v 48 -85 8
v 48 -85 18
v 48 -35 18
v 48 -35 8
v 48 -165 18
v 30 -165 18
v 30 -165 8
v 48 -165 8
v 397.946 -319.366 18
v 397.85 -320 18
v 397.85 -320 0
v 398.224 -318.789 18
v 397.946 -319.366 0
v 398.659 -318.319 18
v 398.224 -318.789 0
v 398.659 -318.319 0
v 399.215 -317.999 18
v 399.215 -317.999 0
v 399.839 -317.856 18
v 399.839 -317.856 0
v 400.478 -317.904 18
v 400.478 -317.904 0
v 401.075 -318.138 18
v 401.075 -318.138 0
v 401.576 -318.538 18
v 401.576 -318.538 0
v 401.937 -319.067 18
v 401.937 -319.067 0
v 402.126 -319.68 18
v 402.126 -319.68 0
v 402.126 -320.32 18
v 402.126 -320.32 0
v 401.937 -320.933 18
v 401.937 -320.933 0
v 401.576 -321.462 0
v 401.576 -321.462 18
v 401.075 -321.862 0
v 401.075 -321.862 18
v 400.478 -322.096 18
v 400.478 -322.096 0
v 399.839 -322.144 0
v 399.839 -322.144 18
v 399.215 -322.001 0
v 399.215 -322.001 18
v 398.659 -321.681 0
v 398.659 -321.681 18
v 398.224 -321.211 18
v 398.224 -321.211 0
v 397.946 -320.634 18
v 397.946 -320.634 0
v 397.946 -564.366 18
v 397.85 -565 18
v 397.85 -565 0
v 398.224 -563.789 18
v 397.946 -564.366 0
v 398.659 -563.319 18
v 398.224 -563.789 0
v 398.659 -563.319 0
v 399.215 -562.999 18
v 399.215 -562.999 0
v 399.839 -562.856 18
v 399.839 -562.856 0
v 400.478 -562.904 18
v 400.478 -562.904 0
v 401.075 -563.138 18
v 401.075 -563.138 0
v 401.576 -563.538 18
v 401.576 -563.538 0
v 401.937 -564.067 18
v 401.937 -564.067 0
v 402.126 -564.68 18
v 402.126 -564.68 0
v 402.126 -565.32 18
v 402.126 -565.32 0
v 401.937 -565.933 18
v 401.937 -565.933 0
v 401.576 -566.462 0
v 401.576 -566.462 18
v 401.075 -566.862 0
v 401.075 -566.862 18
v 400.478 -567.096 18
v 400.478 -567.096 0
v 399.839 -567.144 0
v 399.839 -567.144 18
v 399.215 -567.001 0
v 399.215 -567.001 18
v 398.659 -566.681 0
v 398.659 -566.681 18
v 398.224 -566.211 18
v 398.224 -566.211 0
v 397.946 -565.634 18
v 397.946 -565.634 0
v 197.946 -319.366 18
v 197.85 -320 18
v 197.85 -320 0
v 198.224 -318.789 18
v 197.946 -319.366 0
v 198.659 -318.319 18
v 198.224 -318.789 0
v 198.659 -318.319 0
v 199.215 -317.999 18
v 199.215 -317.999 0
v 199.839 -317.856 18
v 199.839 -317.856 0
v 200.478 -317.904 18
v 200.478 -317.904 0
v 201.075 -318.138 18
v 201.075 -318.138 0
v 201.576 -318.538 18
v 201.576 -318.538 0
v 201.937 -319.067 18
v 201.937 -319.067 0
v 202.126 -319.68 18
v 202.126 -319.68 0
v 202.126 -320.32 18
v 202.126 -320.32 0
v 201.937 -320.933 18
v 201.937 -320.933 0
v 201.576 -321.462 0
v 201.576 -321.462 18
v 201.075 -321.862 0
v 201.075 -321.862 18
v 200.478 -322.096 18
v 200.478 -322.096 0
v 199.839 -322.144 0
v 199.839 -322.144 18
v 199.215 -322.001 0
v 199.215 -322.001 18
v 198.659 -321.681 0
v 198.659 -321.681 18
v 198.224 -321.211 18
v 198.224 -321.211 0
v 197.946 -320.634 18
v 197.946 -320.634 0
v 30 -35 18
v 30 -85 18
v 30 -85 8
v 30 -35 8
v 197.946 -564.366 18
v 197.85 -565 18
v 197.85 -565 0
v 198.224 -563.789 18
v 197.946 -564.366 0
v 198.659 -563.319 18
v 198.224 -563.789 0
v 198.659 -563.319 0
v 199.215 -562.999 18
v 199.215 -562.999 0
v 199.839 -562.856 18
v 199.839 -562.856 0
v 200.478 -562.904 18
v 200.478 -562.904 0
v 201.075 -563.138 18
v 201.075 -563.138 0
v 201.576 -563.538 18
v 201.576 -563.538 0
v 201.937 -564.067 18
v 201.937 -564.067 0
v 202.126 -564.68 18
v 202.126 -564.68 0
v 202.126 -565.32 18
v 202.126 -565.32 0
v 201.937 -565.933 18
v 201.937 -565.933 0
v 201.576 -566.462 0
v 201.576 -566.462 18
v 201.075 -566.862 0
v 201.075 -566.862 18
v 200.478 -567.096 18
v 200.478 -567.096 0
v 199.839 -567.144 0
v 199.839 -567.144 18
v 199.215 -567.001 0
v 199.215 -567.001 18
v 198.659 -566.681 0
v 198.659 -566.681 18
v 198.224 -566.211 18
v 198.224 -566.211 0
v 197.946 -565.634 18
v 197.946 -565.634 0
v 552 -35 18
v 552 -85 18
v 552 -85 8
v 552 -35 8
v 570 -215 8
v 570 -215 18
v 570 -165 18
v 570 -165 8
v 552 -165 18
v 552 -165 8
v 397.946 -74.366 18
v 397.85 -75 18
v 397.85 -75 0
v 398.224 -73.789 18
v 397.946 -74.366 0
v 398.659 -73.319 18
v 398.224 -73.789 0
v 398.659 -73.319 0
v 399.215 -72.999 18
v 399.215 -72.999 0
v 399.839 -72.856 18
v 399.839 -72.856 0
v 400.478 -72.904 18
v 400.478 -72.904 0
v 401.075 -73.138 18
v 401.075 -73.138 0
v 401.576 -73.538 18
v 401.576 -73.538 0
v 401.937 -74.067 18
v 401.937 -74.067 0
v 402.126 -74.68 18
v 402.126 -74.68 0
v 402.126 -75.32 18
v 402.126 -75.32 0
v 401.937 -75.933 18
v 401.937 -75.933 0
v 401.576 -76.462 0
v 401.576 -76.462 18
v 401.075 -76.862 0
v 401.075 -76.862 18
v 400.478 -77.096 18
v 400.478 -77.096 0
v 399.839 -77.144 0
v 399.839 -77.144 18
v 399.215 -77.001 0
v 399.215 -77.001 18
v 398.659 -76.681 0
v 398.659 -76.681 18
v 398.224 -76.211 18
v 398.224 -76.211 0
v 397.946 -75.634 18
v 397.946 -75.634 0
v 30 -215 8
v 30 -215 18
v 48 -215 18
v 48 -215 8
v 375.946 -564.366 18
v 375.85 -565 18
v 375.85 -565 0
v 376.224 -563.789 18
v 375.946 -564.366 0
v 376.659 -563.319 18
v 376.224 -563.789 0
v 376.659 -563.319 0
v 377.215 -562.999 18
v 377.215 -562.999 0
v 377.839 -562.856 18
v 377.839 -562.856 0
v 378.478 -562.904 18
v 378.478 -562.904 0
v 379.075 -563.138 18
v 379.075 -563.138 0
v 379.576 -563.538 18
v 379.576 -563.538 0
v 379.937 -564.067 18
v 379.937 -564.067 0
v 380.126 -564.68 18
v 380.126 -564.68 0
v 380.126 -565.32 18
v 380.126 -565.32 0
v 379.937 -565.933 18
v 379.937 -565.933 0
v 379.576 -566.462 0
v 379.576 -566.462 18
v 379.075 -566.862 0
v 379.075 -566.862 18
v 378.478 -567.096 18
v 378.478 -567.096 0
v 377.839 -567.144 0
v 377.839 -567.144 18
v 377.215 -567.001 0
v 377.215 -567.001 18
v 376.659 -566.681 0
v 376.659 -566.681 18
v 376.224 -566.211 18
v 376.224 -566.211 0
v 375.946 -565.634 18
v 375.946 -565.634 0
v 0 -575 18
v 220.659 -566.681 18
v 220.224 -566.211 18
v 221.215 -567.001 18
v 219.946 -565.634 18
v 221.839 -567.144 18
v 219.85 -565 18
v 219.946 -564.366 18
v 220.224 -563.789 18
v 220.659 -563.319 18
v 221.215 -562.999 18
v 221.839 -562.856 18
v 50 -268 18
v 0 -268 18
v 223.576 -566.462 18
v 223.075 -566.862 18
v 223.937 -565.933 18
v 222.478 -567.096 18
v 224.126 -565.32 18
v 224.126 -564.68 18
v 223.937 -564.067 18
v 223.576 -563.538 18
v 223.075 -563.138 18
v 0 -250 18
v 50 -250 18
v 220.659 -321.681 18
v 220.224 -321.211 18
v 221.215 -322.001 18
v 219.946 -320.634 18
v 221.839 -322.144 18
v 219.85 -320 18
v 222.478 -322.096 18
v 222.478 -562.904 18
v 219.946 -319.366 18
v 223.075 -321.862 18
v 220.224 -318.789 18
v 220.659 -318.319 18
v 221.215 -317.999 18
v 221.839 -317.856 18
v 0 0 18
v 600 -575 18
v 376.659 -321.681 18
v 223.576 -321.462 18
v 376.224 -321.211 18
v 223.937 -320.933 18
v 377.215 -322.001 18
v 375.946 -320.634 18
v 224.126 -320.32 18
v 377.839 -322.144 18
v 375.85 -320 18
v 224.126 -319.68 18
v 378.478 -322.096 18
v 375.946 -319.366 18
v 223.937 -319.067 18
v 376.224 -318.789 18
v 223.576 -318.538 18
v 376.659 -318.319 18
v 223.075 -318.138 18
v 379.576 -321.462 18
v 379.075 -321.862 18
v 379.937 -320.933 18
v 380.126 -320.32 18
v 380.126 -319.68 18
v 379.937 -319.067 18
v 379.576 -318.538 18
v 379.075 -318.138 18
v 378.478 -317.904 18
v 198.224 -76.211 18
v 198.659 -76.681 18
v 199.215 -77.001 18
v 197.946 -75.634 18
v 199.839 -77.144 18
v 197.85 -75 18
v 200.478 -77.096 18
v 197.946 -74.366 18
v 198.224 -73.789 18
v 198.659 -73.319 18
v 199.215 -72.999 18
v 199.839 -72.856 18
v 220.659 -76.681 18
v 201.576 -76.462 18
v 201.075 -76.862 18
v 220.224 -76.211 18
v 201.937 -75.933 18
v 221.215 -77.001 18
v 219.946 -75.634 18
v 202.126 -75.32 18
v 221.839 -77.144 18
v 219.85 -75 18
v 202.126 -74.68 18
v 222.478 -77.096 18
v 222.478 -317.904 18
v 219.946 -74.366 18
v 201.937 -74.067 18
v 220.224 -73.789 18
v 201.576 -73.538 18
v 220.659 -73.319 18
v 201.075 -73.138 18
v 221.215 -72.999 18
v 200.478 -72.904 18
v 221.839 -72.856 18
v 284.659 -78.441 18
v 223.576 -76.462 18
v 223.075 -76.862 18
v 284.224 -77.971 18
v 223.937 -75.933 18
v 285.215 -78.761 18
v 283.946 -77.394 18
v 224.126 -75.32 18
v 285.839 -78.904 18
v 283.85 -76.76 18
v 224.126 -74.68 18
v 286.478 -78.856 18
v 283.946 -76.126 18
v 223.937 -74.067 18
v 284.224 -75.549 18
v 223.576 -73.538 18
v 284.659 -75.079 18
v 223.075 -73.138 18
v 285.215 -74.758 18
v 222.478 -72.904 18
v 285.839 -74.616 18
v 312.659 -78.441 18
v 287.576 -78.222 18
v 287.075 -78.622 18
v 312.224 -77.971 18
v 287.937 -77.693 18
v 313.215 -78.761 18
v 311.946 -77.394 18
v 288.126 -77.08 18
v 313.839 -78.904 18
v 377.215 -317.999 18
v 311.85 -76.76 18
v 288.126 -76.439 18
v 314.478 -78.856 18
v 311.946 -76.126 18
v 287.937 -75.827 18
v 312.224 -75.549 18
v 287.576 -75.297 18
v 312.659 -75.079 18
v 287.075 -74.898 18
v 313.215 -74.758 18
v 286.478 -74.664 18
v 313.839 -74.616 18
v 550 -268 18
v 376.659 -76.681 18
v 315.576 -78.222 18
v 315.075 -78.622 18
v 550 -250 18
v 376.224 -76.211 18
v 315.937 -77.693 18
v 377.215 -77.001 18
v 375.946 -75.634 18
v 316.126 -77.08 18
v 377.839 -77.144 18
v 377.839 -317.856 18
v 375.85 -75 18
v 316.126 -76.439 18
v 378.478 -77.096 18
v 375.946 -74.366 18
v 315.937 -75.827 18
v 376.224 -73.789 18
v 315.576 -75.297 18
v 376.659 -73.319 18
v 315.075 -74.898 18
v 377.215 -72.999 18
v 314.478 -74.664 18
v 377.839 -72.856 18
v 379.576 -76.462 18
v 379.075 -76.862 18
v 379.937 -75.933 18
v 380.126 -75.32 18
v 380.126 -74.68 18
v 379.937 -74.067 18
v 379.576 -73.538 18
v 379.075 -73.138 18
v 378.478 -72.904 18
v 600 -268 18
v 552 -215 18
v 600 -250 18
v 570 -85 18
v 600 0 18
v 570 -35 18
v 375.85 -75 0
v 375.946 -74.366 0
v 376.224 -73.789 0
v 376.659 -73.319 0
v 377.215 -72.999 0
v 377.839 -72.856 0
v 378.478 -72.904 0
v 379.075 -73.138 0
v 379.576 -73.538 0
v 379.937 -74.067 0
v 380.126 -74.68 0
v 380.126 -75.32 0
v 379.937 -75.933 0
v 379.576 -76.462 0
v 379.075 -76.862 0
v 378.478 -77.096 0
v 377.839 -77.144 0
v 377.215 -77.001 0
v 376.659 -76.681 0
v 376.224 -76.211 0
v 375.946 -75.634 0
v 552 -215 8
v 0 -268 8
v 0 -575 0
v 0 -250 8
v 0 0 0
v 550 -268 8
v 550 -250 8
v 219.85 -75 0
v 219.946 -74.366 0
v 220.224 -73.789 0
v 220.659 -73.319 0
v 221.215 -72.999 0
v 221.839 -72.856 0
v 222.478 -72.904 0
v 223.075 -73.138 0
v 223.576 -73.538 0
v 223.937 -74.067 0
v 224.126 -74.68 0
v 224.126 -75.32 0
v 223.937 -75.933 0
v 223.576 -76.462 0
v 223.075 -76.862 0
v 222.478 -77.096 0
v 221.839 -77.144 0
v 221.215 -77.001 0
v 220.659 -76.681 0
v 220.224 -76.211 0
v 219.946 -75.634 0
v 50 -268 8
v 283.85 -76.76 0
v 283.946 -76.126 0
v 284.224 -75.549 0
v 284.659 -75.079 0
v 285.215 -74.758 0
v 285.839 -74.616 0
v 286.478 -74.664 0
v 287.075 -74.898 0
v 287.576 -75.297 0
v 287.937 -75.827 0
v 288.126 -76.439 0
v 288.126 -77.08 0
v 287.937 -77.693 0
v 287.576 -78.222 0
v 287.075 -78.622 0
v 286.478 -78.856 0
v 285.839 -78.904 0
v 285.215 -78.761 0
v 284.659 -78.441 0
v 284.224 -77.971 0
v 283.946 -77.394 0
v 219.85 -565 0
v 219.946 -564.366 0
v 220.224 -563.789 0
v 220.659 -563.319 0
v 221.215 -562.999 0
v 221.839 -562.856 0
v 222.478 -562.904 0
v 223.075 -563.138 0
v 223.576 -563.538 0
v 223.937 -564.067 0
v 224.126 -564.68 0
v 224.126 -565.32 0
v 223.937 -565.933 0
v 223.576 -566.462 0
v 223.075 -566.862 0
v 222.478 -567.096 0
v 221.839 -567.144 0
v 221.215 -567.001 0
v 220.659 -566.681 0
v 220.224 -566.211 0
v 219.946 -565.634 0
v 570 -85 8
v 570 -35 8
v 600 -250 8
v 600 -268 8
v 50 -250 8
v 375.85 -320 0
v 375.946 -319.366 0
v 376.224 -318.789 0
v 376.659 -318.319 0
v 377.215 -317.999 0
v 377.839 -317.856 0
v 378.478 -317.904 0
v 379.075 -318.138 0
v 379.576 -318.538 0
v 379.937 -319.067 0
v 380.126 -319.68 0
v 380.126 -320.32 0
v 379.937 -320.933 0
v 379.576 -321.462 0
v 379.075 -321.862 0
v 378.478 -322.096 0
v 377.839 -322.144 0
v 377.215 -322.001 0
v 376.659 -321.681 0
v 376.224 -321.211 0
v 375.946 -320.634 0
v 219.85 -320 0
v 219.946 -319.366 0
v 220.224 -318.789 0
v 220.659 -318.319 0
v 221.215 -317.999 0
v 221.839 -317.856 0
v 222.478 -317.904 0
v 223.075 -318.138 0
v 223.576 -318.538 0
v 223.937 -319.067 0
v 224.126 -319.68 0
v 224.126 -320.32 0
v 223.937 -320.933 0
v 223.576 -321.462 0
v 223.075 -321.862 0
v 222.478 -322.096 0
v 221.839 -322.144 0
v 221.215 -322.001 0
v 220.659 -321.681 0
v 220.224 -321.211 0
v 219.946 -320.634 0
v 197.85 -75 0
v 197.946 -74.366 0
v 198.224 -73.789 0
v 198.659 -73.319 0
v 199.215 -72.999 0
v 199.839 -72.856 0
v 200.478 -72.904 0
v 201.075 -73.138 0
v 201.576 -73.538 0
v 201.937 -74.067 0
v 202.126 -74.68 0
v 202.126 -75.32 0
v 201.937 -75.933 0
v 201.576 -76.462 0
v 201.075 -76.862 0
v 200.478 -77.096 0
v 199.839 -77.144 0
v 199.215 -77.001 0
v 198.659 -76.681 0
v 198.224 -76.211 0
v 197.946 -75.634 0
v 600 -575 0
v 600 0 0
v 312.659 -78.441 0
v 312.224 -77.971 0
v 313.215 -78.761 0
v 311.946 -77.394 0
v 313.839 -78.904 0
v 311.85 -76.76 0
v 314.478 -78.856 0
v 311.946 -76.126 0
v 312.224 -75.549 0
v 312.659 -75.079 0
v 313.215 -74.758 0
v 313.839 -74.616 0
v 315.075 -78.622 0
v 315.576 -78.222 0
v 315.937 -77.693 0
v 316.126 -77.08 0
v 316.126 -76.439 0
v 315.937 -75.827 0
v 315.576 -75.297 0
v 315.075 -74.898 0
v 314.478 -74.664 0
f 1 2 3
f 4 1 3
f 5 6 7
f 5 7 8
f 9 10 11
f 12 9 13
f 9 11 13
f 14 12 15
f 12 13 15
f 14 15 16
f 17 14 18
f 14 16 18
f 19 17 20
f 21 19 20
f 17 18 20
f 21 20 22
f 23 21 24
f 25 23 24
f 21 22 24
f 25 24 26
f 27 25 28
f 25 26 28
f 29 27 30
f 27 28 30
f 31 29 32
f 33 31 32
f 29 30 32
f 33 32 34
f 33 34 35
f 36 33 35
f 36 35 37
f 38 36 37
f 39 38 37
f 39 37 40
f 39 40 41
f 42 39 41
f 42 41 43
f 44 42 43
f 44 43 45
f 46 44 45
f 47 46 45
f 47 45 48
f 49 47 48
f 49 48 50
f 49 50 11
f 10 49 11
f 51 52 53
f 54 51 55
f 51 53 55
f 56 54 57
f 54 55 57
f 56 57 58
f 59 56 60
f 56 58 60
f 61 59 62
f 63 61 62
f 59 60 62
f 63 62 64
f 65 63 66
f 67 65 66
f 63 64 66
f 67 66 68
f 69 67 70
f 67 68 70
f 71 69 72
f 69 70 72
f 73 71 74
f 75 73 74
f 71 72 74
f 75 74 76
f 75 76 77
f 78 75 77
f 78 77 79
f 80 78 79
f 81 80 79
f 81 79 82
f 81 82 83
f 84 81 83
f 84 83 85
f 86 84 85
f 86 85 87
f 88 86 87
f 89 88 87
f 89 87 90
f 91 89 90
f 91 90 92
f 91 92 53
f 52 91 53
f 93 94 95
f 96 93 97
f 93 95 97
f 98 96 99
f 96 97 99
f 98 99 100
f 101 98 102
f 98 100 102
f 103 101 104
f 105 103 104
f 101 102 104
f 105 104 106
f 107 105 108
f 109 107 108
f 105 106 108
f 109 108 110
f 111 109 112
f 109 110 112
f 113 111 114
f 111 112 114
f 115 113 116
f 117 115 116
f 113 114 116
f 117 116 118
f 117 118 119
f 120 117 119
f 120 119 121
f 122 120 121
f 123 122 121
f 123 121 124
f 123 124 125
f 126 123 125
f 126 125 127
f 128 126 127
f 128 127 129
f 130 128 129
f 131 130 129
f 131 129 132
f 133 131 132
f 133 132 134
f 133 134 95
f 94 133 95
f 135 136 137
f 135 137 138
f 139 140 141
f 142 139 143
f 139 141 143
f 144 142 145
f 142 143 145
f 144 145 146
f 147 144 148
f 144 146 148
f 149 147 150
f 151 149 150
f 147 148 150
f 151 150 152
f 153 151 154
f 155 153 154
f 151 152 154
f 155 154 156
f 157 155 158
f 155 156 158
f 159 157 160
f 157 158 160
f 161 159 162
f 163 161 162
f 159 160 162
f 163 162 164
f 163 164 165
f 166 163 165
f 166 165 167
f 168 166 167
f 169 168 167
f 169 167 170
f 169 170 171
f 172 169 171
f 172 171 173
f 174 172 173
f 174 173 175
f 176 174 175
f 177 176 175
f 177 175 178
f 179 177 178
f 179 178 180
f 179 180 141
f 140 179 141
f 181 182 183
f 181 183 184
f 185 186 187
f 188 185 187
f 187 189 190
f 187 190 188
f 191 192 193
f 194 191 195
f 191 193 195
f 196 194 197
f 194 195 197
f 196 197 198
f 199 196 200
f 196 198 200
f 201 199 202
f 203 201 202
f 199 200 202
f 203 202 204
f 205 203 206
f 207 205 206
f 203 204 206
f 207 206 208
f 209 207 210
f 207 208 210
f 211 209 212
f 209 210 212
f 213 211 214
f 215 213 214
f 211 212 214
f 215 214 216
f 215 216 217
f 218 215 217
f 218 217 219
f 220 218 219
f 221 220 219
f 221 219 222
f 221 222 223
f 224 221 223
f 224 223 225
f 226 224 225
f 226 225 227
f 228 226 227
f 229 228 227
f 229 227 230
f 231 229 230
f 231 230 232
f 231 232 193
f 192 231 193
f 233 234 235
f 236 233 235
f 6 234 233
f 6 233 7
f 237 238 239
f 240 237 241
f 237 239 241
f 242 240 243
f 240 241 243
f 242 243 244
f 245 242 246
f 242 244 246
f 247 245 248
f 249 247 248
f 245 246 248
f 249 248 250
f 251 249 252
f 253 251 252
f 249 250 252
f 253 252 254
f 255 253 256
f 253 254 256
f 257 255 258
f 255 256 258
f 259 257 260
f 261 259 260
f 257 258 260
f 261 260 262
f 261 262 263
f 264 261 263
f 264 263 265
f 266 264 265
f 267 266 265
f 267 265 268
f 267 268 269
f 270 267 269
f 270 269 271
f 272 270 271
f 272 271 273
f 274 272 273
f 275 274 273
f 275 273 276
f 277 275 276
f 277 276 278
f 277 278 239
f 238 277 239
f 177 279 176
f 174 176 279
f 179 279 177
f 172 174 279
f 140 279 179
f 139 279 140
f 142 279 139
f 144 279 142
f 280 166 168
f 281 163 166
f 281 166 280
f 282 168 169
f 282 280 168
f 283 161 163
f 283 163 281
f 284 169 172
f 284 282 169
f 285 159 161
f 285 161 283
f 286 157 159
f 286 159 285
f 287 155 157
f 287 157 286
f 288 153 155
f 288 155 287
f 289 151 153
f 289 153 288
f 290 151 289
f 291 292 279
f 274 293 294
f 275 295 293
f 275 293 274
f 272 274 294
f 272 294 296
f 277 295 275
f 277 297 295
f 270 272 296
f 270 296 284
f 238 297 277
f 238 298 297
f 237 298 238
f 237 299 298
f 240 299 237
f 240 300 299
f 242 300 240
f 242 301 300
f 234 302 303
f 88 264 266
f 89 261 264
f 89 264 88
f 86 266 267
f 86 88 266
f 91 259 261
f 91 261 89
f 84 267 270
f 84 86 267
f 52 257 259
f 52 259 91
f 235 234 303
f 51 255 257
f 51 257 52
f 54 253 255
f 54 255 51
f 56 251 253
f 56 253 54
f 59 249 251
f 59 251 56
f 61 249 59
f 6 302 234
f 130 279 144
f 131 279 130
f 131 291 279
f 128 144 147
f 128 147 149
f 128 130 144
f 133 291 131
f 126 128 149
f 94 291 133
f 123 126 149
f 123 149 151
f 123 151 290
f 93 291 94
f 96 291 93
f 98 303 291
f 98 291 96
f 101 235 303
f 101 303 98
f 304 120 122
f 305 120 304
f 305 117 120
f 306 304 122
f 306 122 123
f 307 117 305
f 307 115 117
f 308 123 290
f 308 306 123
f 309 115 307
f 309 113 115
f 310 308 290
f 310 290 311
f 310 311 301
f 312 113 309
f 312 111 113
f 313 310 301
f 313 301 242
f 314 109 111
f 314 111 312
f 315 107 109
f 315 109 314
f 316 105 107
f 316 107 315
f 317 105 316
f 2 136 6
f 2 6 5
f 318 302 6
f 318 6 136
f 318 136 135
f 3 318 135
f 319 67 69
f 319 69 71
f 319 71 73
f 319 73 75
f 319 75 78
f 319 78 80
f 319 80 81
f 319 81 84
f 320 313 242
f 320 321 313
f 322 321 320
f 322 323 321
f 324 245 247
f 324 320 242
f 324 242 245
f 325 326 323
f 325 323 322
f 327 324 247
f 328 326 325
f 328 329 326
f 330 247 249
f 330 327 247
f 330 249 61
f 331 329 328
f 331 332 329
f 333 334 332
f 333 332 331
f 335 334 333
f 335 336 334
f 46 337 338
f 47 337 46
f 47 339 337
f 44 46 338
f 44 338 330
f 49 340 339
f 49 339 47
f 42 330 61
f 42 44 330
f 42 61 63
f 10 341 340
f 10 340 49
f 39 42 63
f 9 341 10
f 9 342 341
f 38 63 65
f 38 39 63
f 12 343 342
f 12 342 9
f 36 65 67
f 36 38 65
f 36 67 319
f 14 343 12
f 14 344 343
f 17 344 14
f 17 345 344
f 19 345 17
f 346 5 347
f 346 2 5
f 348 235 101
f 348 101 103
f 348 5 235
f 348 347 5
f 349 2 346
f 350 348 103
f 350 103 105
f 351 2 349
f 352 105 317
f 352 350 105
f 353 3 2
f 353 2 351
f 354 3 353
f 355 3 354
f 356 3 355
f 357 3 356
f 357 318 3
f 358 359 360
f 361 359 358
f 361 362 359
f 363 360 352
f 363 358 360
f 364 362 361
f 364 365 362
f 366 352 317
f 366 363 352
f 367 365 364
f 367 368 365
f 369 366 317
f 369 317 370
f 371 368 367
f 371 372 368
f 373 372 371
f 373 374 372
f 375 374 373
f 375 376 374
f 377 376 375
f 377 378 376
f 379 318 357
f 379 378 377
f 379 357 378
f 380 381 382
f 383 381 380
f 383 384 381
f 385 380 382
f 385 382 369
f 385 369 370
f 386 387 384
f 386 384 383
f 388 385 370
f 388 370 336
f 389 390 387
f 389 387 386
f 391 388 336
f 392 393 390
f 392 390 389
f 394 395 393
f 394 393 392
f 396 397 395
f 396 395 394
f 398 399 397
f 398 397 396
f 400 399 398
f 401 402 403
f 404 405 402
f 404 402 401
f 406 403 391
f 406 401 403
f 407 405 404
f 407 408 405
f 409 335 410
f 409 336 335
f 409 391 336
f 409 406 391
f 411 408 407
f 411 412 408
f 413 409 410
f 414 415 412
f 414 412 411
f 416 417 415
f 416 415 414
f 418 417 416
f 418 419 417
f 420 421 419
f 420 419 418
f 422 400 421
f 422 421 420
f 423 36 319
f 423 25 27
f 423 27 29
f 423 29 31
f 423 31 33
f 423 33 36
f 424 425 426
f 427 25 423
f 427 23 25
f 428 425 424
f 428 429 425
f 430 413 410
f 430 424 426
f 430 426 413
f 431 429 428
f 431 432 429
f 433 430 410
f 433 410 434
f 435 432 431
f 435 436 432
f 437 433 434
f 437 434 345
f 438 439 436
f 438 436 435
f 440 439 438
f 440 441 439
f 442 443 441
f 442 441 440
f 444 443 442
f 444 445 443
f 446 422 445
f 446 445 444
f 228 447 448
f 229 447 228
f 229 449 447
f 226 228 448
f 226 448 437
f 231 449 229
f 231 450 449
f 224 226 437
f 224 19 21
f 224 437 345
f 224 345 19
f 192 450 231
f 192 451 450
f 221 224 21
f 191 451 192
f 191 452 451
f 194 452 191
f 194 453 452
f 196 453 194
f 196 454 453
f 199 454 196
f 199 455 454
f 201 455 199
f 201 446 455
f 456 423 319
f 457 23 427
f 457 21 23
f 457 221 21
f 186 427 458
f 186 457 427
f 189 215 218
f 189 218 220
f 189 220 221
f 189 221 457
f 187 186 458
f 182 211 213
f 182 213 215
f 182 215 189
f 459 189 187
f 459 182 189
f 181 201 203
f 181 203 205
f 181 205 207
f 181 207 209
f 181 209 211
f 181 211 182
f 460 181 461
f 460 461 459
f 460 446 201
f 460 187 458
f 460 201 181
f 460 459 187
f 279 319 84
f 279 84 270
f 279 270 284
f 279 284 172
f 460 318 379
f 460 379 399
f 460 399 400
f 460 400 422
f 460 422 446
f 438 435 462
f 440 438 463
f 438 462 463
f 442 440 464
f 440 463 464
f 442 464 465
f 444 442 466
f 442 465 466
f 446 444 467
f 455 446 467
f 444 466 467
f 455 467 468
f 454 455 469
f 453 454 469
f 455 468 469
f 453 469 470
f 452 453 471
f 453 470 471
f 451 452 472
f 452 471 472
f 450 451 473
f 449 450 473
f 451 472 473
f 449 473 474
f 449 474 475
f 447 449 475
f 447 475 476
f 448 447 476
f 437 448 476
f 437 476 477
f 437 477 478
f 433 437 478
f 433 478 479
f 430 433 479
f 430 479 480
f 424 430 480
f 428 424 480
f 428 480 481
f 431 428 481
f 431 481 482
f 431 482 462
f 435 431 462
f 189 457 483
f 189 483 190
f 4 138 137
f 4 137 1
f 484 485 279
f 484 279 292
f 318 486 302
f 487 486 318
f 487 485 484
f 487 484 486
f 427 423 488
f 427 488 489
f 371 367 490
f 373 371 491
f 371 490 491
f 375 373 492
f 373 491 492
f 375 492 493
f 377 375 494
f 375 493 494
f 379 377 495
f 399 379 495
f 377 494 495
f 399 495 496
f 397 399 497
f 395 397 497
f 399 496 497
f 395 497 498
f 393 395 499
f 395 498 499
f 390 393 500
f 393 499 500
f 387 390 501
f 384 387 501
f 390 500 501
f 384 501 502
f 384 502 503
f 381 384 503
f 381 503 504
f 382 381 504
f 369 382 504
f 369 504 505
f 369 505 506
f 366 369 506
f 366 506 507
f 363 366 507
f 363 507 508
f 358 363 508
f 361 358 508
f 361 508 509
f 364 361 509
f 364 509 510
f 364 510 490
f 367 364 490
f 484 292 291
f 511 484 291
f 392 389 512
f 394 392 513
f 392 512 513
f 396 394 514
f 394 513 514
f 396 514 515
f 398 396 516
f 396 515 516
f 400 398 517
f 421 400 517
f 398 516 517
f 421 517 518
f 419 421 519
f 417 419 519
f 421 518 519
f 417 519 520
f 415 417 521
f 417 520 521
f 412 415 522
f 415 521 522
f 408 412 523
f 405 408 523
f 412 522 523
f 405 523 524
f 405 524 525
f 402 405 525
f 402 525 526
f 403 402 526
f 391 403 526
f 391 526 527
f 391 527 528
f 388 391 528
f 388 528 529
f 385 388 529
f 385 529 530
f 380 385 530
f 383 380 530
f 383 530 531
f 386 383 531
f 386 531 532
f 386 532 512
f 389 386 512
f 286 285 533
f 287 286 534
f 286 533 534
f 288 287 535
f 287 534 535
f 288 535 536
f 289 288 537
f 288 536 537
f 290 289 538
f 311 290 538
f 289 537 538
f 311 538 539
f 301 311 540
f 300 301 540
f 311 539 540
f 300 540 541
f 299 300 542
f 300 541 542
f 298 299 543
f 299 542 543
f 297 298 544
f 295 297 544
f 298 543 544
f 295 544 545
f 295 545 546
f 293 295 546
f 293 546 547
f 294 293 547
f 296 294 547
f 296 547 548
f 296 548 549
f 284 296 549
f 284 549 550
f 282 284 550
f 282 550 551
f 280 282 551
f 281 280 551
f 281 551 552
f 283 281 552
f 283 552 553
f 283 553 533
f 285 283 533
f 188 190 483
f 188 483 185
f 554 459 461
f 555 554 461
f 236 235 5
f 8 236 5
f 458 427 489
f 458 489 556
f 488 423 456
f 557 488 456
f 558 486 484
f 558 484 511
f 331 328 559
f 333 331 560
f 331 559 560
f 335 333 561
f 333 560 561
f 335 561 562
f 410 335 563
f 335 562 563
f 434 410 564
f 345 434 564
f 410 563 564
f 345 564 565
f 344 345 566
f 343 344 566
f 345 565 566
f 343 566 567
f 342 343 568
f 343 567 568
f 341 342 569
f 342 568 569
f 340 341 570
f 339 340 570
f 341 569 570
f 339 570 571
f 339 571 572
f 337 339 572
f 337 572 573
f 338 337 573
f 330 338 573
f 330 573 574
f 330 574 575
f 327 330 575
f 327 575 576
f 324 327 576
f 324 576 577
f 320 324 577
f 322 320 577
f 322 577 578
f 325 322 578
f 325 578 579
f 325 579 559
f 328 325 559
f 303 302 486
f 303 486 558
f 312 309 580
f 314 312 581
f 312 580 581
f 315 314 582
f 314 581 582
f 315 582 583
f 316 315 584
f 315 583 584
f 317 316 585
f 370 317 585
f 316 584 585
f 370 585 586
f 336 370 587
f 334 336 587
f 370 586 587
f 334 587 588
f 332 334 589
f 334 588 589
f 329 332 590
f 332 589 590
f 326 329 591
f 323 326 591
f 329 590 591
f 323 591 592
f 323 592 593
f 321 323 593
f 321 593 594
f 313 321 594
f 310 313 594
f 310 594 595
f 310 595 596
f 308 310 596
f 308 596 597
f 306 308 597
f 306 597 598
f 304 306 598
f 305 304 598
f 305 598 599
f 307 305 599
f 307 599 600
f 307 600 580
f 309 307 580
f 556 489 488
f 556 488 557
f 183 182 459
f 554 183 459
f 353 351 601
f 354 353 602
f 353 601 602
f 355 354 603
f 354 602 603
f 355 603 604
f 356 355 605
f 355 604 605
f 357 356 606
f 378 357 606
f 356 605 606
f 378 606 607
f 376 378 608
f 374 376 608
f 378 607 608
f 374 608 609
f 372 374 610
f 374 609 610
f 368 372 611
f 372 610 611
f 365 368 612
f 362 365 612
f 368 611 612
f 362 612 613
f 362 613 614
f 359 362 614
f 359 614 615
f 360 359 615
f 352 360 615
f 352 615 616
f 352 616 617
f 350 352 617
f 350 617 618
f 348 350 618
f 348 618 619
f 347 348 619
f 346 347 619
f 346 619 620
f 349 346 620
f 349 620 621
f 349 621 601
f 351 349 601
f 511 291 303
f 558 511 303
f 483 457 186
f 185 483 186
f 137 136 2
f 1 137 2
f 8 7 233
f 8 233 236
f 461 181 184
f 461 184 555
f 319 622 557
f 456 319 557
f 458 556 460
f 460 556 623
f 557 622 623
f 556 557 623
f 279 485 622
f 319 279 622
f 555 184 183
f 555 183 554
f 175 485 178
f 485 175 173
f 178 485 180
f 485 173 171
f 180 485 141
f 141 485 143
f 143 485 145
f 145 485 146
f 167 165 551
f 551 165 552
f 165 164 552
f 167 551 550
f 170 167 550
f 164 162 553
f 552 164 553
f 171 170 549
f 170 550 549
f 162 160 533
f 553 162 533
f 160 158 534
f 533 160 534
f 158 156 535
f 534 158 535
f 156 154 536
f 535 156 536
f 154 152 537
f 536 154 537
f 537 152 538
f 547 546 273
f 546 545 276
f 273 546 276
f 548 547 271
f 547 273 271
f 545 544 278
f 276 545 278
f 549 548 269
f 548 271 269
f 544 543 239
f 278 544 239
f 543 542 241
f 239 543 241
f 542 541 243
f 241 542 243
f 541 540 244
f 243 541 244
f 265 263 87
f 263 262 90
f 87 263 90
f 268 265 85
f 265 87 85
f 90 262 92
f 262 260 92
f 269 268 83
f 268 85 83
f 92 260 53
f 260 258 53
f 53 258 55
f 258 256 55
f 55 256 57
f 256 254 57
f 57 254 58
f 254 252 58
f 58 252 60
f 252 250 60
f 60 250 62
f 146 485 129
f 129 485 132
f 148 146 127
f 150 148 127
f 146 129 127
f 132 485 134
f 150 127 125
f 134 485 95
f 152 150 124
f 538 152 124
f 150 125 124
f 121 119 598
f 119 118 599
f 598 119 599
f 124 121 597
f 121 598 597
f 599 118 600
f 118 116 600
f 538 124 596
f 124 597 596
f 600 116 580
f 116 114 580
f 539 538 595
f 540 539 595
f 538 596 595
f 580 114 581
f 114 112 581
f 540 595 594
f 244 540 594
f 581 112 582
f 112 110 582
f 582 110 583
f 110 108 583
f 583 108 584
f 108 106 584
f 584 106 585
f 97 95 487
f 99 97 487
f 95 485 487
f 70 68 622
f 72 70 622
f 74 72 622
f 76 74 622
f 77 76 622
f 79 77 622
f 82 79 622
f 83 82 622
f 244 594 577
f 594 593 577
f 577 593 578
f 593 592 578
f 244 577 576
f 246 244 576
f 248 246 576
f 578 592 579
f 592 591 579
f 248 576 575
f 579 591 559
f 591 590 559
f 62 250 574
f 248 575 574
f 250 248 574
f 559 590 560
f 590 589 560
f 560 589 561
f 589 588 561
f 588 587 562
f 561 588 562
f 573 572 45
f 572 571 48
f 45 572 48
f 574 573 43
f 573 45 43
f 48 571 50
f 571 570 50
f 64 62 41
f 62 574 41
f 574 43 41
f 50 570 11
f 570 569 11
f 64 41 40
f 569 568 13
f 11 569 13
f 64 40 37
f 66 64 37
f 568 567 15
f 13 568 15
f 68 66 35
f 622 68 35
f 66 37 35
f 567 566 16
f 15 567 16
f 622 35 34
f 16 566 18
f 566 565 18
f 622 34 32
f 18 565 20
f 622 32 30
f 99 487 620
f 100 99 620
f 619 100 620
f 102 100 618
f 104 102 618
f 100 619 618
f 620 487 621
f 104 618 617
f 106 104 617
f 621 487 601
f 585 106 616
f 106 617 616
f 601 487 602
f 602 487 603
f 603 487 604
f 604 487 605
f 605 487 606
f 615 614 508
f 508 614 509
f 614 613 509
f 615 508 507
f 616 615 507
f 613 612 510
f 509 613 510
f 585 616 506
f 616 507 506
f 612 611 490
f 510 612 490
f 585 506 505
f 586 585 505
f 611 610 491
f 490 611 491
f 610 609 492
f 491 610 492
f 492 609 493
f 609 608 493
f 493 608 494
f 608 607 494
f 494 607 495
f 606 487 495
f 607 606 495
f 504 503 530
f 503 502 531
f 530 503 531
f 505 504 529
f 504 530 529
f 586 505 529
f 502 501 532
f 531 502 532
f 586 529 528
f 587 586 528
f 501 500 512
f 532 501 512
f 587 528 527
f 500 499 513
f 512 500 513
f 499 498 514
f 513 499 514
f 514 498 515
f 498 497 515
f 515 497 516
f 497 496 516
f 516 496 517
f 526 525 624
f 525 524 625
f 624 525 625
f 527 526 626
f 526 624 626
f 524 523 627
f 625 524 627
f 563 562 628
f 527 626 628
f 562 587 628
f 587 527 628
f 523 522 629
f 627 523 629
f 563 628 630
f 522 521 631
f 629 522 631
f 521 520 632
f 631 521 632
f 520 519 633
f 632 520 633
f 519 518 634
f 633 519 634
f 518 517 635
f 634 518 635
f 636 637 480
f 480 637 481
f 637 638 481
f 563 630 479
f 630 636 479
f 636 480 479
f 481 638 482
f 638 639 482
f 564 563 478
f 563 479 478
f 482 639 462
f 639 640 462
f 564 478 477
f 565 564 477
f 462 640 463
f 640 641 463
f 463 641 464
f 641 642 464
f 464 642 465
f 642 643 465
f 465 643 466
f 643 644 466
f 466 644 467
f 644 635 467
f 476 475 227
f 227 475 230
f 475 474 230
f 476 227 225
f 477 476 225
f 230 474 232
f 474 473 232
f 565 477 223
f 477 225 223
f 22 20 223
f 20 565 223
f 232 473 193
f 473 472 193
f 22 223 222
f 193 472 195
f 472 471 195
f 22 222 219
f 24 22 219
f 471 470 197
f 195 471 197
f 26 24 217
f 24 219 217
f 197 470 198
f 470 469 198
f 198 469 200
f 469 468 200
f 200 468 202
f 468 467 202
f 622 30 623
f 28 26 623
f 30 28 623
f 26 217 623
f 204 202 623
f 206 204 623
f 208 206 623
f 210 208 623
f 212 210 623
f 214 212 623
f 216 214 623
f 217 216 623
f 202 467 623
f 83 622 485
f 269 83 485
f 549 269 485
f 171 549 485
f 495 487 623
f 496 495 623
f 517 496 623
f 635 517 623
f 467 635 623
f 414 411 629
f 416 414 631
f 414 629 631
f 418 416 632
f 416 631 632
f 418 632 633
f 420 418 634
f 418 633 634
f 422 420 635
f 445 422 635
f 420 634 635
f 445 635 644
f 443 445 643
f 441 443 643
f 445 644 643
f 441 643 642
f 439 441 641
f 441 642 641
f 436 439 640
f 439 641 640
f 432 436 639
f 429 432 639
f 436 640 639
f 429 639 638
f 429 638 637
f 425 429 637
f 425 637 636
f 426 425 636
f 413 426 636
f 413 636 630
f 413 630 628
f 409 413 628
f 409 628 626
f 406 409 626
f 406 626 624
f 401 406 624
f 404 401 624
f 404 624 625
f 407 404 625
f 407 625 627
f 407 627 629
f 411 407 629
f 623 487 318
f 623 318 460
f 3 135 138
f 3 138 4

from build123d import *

# Parameters (mm, degrees)
F0_W     = 600
F0_H     = 575
F1_DEPTH = 18
F2_W     = 18
F2_H     = 50
F2_W_2   = 50
F2_H_2   = 18
F3_DEPTH = 10
F5_D     = 4.3
F6_D     = 4.3


with BuildPart() as f1:
    # F0 (on Top) → F1 (new body)
    with BuildSketch(Plane.XY):
        with Locations((300, -287.5)):
            Rectangle(F0_W, F0_H)
    extrude(amount=F1_DEPTH)

    # F2 (on face) → F3 (cut)
    with BuildSketch(Plane.XY.offset(18)):
        with Locations((39, -60)):
            Rectangle(F2_W, F2_H)
        with Locations((561, -60)):
            Rectangle(F2_W, F2_H)
        with Locations((561, -190)):
            Rectangle(F2_W, F2_H)
        with Locations((575, -259)):
            Rectangle(F2_W_2, F2_H_2)
        with Locations((25, -259)):
            Rectangle(F2_W_2, F2_H_2)
        with Locations((39, -190)):
            Rectangle(F2_W, F2_H)
    extrude(amount=-F3_DEPTH, mode=Mode.SUBTRACT)

    # F5 (through all)
    with Locations(Plane.XY.offset(18)):
        with Locations((200, -75), (222, -75), (200, -320), (222, -320), (378, -75), (400, -75), (400, -320), (378, -320), (378, -565), (400, -565), (200, -565), (222, -565)):
            Hole(F5_D / 2)

    # F6 (through all)
    with Locations(Plane.XY.offset(18)):
        with Locations((286, -76.75982), (314, -76.75982)):
            Hole(F6_D / 2)


solid = f1.part
